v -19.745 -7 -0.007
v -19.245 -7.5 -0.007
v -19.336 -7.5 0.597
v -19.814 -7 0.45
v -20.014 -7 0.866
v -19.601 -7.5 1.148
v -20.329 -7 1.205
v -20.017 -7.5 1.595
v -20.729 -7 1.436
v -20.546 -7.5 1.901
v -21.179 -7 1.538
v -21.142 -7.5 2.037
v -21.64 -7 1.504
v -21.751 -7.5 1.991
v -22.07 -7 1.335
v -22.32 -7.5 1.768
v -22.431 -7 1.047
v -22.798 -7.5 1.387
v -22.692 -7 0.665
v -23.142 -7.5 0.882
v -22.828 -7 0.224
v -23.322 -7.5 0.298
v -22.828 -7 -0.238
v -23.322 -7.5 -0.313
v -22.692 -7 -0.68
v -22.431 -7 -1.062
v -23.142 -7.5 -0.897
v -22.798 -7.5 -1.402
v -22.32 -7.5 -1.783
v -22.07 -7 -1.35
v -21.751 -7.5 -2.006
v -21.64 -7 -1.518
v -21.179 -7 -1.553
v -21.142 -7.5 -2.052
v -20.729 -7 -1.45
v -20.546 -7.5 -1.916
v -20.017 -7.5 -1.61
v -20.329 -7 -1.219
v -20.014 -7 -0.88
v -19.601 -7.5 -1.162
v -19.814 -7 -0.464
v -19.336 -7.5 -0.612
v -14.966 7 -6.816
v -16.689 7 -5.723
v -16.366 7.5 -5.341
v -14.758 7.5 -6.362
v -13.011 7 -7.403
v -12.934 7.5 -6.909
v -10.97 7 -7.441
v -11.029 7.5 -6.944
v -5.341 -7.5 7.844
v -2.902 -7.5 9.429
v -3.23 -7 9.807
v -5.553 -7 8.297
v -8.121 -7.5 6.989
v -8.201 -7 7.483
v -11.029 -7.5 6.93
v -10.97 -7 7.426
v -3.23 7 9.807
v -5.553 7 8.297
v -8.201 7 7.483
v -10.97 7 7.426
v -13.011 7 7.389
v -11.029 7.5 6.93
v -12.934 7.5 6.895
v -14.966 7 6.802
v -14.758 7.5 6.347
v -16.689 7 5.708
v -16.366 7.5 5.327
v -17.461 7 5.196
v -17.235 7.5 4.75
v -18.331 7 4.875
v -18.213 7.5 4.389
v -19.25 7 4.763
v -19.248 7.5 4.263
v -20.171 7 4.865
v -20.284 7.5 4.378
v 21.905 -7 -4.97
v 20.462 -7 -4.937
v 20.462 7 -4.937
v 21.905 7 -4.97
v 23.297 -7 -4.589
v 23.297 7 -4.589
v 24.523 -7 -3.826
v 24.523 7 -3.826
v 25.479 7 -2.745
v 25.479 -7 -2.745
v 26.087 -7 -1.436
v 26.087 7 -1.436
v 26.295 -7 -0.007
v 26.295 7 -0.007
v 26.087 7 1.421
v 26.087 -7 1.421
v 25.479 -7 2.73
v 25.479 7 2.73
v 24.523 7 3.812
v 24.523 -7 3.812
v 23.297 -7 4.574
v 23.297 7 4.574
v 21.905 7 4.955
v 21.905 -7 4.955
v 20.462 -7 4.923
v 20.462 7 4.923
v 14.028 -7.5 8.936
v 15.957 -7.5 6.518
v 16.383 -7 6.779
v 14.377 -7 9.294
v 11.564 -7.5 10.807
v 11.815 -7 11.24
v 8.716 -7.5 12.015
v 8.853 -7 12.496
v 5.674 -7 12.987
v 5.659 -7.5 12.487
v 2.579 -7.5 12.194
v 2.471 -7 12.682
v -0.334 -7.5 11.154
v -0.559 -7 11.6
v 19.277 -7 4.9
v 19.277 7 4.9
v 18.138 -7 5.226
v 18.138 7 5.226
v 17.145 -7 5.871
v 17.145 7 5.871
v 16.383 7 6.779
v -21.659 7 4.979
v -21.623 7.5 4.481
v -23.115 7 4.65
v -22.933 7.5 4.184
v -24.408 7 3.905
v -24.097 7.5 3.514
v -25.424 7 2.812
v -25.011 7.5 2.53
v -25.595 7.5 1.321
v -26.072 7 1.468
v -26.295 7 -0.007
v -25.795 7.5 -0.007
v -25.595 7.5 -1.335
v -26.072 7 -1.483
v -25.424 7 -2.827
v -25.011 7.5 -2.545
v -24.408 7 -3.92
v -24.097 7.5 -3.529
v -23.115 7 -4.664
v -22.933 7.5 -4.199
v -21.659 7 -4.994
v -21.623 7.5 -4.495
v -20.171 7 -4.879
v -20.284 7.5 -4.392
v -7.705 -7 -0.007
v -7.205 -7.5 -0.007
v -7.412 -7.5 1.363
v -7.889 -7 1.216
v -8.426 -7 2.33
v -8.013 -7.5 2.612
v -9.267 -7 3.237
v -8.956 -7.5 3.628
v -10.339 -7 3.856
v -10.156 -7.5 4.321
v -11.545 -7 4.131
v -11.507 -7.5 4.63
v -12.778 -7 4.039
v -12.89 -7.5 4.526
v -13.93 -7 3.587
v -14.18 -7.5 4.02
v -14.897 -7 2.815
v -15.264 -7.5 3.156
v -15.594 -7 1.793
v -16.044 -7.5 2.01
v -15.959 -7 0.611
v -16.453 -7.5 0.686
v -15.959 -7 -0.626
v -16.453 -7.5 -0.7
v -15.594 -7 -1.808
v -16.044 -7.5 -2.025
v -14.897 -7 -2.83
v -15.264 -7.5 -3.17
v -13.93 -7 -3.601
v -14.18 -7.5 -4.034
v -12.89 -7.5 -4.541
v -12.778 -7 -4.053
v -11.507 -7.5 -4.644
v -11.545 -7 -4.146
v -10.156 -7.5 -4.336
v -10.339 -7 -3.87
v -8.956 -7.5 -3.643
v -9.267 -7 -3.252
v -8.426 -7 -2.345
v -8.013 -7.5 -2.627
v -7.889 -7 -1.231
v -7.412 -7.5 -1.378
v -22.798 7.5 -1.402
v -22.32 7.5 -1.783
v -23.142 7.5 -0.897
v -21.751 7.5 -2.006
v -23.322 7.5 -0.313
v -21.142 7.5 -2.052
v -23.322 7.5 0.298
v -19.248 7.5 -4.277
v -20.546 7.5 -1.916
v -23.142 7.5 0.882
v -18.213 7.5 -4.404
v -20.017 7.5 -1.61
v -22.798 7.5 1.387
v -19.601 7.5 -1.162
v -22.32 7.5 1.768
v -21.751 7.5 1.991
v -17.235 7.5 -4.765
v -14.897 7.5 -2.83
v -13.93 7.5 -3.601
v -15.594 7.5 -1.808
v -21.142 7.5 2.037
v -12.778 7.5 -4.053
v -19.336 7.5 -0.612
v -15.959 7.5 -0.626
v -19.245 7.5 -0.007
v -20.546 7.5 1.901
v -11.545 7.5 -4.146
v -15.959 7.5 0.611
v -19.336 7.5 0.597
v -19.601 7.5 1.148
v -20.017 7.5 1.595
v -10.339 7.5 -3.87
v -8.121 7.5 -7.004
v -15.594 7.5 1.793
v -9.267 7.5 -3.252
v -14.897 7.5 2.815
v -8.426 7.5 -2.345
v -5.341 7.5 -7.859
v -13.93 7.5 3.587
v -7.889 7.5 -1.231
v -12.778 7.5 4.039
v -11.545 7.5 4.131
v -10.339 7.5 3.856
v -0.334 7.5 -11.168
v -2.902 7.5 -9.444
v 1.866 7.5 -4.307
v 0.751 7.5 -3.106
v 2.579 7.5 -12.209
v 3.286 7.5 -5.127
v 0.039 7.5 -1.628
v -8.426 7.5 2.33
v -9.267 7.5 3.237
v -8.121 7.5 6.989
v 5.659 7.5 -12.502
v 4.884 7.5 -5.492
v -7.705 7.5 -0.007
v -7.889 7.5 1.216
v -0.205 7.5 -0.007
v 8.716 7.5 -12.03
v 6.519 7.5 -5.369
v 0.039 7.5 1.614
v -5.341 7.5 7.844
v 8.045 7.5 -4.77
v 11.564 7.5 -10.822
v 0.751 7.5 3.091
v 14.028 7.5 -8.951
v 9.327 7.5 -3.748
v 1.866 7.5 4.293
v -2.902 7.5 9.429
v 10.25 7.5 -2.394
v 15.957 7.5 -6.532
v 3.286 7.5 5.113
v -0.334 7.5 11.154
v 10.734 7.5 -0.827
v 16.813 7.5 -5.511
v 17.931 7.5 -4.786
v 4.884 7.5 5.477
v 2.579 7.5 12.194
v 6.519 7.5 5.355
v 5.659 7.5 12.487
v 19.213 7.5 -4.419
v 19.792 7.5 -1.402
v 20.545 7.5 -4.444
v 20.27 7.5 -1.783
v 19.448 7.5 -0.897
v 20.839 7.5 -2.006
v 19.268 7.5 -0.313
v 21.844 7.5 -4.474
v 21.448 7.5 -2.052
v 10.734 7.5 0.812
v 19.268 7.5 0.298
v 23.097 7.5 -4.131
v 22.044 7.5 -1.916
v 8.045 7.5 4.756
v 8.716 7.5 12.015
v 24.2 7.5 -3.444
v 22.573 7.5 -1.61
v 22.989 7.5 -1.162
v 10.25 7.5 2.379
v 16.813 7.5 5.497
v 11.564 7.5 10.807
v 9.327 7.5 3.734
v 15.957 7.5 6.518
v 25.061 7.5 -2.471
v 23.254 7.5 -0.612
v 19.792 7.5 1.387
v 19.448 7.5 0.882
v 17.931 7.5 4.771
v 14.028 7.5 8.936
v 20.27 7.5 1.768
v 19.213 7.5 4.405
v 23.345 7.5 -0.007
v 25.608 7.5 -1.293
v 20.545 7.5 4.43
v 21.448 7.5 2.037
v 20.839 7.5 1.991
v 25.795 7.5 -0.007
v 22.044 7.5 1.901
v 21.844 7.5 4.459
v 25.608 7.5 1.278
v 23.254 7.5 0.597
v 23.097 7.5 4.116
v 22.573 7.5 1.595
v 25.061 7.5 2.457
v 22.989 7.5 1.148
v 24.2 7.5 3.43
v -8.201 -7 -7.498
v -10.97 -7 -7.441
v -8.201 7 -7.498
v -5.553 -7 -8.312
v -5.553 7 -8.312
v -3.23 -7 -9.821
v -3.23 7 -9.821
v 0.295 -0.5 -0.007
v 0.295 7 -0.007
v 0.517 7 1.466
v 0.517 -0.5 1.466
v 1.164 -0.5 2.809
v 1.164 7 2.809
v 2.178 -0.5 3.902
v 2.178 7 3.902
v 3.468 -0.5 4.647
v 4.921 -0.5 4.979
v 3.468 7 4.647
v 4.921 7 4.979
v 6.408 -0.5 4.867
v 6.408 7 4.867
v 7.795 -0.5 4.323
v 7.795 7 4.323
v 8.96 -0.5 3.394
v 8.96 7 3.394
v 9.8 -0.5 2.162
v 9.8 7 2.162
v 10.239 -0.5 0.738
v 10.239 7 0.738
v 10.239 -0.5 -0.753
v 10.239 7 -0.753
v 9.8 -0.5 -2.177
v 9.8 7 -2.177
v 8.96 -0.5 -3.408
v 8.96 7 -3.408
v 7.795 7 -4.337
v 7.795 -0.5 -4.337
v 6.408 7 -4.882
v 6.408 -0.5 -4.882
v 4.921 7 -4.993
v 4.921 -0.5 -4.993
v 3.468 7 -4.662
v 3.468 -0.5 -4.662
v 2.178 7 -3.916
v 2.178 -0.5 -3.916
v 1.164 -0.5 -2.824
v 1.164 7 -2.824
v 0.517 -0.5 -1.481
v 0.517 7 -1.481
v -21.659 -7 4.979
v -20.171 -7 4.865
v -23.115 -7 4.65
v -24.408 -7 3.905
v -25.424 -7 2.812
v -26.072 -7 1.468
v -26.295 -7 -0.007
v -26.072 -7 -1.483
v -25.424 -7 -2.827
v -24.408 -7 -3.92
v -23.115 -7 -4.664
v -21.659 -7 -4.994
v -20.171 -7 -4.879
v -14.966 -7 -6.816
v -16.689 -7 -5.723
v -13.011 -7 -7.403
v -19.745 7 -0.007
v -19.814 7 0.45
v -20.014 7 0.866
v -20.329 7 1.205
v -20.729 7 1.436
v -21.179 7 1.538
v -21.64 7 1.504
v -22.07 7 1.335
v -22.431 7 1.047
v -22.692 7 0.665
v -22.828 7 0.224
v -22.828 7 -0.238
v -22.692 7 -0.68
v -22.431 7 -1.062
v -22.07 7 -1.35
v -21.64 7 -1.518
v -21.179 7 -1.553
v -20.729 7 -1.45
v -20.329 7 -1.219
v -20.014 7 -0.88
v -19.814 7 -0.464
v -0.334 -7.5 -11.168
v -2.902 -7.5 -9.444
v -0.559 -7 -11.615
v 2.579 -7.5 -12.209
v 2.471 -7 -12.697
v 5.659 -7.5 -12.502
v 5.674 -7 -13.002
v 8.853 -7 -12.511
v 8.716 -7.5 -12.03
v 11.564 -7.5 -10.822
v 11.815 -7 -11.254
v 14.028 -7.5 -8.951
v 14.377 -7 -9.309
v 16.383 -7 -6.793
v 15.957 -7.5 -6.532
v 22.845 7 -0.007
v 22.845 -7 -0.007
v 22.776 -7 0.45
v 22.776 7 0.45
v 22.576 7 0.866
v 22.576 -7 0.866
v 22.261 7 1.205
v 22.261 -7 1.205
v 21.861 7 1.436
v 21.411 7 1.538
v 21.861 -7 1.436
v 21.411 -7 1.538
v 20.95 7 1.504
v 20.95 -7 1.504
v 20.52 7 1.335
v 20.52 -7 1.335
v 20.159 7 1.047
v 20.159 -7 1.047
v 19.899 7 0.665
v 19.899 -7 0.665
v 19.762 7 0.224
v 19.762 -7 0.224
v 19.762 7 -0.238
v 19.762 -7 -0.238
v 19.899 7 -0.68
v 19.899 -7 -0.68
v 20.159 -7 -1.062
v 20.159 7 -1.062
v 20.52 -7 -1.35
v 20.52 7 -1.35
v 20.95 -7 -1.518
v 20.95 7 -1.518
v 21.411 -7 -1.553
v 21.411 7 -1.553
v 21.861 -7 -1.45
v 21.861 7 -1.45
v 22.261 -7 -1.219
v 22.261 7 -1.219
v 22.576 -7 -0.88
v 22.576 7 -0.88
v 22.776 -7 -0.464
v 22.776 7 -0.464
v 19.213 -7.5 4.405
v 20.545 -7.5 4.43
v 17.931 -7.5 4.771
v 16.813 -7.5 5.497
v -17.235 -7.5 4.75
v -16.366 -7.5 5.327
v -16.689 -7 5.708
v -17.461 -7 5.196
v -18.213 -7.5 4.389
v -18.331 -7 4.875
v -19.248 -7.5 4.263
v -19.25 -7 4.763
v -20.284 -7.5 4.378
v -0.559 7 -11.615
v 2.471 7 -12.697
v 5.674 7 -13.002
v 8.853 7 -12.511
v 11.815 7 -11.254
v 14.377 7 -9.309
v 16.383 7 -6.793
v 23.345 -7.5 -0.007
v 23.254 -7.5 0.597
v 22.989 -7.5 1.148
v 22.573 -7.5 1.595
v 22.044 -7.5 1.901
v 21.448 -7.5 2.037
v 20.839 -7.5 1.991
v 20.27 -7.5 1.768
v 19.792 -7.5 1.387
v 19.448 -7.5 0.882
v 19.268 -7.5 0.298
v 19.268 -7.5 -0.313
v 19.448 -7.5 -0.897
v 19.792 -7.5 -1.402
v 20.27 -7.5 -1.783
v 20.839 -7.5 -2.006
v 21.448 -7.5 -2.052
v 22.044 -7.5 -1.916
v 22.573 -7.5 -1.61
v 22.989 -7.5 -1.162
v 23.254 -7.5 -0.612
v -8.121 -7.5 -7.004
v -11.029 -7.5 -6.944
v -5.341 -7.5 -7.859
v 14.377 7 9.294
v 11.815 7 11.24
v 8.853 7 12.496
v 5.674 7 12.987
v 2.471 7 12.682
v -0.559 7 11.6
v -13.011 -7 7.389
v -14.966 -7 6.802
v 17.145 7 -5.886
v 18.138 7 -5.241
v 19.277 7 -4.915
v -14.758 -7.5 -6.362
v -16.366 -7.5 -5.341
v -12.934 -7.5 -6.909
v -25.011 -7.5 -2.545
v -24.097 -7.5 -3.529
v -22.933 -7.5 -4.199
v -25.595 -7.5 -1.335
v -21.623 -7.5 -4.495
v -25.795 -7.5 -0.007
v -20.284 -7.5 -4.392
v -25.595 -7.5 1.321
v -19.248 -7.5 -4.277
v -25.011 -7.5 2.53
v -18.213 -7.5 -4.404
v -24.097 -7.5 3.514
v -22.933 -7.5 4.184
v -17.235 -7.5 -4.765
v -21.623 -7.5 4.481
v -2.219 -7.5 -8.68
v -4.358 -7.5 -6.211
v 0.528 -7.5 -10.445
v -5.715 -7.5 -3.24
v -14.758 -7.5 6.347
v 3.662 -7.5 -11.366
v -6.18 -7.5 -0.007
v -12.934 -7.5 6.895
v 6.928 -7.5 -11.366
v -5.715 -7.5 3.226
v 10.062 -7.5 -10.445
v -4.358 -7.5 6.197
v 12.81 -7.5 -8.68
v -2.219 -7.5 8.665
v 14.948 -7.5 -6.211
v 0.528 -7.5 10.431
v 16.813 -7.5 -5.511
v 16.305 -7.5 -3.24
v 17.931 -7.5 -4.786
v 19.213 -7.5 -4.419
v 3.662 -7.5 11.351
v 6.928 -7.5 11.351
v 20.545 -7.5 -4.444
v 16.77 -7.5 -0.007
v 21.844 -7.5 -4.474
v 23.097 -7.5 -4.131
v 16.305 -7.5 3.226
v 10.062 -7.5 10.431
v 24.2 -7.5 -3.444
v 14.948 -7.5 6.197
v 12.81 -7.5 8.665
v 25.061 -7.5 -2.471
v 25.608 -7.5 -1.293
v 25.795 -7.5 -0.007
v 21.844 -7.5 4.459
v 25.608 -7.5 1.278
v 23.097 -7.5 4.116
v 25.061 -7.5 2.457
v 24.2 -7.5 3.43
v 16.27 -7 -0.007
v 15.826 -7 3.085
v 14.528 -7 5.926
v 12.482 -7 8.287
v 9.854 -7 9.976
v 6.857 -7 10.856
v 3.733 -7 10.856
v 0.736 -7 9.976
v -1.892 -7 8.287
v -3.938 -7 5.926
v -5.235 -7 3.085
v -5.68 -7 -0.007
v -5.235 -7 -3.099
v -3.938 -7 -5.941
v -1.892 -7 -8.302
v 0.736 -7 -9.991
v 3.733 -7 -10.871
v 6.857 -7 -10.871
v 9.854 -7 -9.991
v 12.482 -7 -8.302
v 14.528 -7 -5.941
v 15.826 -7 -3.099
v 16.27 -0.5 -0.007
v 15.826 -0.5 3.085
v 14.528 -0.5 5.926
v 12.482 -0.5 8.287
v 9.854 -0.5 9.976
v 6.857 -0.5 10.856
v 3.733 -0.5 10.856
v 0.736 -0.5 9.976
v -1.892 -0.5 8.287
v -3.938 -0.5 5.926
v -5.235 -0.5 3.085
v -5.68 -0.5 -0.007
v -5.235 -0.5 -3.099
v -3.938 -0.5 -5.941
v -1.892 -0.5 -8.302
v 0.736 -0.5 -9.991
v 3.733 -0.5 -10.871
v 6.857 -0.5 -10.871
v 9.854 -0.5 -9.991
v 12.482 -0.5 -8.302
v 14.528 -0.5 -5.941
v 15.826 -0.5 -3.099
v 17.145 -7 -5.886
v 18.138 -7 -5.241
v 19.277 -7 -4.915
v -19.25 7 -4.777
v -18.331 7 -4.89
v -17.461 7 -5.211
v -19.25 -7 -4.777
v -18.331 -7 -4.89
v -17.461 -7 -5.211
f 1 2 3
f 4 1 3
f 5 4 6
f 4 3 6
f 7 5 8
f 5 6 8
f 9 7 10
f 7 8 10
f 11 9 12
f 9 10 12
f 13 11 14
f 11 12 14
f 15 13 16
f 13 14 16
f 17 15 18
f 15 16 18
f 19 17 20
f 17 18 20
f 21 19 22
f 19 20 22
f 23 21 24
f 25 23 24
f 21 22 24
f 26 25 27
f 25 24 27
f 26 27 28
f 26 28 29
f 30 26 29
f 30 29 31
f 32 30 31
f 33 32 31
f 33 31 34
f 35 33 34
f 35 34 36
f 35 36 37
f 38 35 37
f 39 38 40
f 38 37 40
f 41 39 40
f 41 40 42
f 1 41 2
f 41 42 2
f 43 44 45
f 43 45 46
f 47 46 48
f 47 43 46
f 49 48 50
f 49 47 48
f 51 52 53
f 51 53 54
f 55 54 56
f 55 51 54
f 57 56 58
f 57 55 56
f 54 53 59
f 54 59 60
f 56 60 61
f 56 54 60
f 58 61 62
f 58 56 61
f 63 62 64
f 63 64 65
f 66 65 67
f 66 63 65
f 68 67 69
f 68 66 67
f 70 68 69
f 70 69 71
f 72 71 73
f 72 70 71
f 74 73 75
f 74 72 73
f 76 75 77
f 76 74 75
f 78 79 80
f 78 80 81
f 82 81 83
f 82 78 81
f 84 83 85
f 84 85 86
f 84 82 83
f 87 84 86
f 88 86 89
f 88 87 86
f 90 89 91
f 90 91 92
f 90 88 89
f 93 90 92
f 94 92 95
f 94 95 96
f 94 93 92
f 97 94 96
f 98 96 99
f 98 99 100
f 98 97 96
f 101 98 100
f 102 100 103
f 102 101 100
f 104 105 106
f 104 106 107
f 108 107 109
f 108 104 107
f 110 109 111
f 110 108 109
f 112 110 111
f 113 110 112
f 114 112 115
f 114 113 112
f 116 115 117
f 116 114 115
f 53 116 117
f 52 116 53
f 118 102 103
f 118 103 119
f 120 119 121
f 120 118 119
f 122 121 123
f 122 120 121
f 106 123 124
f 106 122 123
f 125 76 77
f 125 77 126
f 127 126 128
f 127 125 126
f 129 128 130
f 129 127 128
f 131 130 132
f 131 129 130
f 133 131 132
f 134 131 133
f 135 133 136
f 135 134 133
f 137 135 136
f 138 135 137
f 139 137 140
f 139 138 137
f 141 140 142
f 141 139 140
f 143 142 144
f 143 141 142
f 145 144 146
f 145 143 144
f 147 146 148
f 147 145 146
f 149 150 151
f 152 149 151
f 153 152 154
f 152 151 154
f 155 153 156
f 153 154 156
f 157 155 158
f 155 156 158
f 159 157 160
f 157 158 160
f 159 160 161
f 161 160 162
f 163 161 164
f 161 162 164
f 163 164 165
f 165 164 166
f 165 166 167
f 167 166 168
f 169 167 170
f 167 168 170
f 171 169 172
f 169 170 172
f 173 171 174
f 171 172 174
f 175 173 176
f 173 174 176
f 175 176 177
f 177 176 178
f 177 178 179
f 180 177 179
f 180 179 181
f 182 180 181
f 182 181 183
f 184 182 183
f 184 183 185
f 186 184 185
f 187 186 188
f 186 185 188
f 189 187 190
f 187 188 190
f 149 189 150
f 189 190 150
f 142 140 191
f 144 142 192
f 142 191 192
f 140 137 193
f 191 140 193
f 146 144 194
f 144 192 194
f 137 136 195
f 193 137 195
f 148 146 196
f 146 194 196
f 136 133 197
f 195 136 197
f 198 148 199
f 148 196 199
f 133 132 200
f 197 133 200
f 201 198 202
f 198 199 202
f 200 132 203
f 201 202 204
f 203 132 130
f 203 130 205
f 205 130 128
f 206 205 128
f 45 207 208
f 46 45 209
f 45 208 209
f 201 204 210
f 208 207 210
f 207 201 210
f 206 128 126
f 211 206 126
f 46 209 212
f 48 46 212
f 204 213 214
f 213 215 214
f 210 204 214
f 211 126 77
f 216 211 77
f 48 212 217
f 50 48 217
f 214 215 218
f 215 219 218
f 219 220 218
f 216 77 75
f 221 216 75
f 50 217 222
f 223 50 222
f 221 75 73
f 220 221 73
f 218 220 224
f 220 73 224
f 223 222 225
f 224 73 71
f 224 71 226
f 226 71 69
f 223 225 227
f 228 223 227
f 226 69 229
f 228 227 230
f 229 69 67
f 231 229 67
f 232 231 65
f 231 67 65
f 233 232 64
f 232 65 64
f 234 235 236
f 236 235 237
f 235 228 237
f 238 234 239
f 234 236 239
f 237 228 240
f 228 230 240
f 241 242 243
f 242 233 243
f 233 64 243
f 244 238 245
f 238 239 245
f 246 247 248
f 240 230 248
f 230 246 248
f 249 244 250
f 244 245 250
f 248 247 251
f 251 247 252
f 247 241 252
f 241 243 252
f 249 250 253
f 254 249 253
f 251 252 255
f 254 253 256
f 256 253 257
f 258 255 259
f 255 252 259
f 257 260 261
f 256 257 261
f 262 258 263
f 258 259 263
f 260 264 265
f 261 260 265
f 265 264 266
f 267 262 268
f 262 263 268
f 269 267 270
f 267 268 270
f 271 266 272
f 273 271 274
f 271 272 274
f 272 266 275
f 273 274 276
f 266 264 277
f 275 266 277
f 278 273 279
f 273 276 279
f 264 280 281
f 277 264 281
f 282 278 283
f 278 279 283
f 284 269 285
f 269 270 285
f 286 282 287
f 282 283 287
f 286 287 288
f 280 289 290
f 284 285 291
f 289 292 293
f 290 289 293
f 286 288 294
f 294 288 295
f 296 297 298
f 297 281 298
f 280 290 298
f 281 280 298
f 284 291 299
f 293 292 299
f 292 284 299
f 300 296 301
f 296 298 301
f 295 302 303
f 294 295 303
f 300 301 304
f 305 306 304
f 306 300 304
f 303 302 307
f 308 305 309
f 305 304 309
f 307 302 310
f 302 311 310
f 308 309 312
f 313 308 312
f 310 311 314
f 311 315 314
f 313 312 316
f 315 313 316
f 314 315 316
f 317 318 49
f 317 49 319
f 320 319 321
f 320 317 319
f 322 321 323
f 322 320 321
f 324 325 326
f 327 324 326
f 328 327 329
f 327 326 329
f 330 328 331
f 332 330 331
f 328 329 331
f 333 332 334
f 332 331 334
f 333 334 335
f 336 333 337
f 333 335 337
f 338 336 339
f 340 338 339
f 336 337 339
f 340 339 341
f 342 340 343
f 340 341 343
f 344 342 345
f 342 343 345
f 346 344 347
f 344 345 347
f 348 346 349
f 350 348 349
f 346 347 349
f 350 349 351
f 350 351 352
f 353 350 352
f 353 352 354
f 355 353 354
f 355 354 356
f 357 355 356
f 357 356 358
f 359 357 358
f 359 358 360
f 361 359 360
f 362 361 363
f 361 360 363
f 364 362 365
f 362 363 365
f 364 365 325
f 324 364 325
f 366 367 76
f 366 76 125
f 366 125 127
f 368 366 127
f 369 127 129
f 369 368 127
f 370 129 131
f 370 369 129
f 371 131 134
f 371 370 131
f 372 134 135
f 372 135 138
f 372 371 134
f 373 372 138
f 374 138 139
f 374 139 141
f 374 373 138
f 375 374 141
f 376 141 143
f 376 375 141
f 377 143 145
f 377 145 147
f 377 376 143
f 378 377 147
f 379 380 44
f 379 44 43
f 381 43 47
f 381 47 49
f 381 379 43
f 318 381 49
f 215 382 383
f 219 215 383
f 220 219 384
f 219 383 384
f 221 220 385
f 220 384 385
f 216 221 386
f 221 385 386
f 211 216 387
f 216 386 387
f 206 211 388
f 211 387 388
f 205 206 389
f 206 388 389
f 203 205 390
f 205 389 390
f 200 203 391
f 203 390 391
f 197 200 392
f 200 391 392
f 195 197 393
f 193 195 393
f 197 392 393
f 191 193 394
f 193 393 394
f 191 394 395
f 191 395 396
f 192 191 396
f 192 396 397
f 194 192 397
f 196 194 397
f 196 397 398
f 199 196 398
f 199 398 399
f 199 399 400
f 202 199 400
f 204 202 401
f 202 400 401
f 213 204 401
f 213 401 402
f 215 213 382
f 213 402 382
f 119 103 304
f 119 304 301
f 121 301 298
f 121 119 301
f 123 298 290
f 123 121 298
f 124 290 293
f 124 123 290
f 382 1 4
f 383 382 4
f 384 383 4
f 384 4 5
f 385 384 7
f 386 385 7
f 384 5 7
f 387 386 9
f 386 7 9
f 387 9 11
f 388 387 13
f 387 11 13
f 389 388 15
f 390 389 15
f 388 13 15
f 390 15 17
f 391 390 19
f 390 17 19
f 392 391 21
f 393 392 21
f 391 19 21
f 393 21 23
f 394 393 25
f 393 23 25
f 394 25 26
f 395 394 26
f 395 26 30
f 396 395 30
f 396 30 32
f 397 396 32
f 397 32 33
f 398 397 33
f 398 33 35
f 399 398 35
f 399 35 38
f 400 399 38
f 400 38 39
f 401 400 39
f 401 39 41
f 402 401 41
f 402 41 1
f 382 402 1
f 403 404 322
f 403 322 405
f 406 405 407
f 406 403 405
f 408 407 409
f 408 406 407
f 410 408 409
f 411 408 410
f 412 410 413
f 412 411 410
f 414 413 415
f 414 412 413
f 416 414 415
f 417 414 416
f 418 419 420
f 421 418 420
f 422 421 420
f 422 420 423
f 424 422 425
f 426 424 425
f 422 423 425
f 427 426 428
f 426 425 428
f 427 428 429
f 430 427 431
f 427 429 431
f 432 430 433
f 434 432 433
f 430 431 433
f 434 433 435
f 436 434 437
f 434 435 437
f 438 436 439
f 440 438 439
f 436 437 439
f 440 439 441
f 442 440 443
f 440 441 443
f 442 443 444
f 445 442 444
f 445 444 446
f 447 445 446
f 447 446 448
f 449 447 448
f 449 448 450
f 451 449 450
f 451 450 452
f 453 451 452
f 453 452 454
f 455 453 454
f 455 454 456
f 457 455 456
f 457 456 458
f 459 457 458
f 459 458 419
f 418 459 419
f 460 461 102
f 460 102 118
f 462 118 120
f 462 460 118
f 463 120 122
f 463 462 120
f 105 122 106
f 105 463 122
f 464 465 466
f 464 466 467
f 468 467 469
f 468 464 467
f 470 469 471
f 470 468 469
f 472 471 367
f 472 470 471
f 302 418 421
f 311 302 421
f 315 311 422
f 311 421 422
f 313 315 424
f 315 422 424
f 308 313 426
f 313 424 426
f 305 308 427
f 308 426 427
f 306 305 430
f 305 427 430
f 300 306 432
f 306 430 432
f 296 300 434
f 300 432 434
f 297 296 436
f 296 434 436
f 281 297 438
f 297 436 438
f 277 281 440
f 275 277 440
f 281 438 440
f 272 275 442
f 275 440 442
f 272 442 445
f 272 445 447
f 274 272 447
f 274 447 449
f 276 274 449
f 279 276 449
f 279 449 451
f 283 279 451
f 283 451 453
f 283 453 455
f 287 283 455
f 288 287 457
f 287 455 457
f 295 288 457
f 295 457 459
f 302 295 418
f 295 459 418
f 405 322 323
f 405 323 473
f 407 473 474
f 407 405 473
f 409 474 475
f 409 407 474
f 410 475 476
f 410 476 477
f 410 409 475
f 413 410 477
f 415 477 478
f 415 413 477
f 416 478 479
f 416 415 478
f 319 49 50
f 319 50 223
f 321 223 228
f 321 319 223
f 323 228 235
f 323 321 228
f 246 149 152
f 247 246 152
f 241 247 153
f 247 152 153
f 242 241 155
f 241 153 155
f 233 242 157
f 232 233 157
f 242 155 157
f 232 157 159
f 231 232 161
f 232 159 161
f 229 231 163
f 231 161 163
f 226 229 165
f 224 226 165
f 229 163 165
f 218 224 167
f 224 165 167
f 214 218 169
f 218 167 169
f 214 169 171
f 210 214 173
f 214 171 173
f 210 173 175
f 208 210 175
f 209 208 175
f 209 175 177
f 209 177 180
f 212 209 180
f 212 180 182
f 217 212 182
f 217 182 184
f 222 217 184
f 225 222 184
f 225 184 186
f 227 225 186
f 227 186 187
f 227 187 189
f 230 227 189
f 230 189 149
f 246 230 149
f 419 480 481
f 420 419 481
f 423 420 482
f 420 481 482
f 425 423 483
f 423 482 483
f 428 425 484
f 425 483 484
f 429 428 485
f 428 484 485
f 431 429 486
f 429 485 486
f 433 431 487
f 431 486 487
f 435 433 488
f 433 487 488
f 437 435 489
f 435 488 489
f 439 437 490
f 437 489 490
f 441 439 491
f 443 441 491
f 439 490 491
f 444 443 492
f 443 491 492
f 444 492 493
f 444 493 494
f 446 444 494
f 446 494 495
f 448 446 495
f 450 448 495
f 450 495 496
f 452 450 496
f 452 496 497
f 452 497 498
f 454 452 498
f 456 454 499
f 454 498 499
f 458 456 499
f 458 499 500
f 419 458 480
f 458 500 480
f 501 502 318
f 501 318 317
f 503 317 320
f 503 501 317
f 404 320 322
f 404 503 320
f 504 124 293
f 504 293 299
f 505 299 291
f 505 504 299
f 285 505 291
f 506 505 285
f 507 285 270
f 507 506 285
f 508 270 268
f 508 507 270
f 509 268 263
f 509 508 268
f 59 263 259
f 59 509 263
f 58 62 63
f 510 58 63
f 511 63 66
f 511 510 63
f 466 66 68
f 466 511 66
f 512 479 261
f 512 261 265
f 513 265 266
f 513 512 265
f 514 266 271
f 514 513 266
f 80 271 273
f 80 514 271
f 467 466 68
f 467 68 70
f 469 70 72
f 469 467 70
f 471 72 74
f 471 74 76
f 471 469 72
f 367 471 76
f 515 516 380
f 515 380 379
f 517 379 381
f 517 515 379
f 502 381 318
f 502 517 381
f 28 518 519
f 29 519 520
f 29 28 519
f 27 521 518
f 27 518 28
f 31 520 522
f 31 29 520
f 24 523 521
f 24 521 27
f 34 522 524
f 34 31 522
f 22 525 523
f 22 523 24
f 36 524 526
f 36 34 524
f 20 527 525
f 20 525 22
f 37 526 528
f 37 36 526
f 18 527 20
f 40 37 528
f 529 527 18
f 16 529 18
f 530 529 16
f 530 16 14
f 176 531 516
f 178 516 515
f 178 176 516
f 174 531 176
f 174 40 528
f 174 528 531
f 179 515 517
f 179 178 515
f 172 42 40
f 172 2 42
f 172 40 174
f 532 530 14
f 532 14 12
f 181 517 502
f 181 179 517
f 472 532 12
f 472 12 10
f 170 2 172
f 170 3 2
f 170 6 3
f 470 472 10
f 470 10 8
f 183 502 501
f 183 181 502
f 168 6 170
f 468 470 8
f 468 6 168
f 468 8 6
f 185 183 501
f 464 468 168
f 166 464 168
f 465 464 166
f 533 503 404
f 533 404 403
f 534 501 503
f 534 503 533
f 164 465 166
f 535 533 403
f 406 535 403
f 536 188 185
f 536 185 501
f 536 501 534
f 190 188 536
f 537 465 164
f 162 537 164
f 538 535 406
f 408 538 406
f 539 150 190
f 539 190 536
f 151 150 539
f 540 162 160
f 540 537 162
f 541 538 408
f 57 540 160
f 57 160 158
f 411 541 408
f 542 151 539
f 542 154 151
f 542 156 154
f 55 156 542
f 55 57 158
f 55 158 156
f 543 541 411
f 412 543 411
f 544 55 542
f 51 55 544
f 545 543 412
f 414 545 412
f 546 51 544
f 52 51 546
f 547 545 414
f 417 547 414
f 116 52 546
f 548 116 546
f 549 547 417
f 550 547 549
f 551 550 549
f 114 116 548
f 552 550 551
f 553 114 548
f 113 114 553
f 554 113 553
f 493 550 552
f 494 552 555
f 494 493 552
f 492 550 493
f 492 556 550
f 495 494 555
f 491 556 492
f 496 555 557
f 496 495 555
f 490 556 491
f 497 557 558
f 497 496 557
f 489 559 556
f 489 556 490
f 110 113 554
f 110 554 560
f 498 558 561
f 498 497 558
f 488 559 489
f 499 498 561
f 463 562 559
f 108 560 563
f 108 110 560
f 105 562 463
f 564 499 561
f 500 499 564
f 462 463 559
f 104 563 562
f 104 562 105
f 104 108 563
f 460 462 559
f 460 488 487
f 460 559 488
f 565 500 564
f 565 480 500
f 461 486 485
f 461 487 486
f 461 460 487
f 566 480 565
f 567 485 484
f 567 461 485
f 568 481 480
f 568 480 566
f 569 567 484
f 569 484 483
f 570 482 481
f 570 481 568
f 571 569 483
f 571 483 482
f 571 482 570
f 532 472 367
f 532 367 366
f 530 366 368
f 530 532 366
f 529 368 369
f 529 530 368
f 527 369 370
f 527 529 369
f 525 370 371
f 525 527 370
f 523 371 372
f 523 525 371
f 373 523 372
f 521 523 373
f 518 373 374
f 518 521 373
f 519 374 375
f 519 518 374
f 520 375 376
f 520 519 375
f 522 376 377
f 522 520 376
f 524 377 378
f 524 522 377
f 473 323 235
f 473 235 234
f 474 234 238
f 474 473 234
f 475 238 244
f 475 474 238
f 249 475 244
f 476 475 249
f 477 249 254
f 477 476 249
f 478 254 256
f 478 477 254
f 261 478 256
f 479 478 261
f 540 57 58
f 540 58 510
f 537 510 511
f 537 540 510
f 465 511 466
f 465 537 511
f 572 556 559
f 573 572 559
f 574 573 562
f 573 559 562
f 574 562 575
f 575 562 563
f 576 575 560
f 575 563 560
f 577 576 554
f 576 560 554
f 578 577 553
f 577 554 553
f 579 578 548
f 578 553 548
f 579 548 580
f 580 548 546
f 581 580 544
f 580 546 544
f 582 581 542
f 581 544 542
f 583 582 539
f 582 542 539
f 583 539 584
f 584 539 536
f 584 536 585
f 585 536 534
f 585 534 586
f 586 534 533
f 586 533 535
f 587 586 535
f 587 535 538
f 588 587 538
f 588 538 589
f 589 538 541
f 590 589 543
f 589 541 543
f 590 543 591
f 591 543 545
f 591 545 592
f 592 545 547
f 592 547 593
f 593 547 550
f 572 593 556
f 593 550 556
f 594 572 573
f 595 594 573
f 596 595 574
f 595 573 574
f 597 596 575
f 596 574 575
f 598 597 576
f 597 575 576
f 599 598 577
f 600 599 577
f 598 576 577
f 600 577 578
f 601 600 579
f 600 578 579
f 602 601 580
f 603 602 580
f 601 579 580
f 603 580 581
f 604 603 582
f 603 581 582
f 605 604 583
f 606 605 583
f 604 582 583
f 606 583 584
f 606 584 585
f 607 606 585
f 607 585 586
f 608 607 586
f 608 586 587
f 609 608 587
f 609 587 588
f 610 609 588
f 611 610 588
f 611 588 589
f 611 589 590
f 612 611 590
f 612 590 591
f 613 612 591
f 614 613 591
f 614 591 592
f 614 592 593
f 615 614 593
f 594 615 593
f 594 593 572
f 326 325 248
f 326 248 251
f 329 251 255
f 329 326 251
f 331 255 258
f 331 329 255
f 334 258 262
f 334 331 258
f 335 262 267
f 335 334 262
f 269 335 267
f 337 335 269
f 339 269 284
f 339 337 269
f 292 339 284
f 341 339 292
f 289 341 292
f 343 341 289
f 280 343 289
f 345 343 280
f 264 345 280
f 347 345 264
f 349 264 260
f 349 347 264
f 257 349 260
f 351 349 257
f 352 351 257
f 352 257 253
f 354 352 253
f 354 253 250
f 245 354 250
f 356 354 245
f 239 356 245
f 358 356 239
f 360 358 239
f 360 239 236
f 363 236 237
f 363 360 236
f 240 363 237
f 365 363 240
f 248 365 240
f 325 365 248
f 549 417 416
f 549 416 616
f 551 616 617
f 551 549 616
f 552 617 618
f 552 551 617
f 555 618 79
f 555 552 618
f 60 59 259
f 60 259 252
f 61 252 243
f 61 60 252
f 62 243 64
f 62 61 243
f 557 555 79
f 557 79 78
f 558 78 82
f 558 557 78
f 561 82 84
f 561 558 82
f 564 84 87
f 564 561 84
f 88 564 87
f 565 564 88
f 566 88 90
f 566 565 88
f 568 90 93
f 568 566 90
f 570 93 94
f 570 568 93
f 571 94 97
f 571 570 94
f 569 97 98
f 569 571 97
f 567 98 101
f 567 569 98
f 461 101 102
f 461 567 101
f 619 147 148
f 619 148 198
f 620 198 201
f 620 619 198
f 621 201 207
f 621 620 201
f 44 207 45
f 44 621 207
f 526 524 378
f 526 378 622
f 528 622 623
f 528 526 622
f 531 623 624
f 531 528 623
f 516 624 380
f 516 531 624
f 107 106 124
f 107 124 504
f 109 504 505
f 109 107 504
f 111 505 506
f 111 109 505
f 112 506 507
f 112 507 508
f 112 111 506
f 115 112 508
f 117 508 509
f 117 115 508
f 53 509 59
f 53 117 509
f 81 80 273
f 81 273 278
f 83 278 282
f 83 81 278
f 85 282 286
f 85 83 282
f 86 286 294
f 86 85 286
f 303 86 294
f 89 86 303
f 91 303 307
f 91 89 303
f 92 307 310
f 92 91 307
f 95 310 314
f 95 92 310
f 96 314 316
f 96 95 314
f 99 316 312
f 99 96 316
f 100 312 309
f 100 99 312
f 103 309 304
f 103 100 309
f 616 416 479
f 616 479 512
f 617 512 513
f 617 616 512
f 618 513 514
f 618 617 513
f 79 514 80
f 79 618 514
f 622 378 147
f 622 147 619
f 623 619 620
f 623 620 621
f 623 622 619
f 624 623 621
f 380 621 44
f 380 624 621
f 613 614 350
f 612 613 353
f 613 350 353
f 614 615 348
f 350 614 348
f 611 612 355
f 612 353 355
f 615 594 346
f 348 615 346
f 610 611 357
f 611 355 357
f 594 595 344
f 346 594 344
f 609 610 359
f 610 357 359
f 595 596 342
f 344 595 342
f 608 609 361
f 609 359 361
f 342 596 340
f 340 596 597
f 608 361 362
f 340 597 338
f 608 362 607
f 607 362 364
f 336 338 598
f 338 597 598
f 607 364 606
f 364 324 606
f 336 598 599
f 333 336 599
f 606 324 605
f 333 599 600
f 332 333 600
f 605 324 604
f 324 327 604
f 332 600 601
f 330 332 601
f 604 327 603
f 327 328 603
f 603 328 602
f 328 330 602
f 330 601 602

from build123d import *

# Parameters (mm, degrees)
F1_R     = 1.5499996566
F1_R_2   = 4.15
F1_R_3   = 10.975
F2_DEPTH = 15
F3_R     = 1.5499996566
F3_R_2   = 10.975
F3_R_3   = 4.15
F3_R_4   = 5
F4_DEPTH = 8
F5_SIZE  = 0.5


# Not quite as in the source:
# - a feature names something its author has since deleted; it is built from what else it names


with BuildPart() as f2:
    # F1 (on offset) → F2 (new body)
    with BuildSketch(Plane.XZ.offset(7.5)):
        with BuildLine():
            ThreePointArc((-16.6892397333, 5.7083826769), (-18.3305665894, 4.8749174948), (-20.1713586703, 4.8647896648))
            ThreePointArc((-20.1713586703, 4.8647896648), (-26.2950827169, -0.0072979827), (-20.1713596113, -4.879386813))
            ThreePointArc((-20.1713596113, -4.879386813), (-18.3305675322, -4.8895149984), (-16.6892408371, -5.7229804975))
            ThreePointArc((-16.6892408371, -5.7229804975), (-14.008426037, -7.1768258733), (-10.9702112996, -7.4408061354))
            ThreePointArc((-10.9702112996, -7.4408061354), (-6.8485397196, -7.8126278343), (-3.2303605207, -9.8214103693))
            ThreePointArc((-3.2303605207, -9.8214103693), (7.2785660743, -12.855093715), (16.3833205976, -6.7933928076))
            ThreePointArc((16.3833205976, -6.7933928076), (18.1382514389, -5.2406931628), (20.4617514792, -4.9373682419))
            ThreePointArc((20.4617514792, -4.9373682419), (26.2950863861, -0.0073004118), (20.4617519197, 4.9227679396))
            ThreePointArc((20.4617519197, 4.9227679396), (18.1382519066, 5.2260930681), (16.383321204, 6.7787928697))
            ThreePointArc((16.383321204, 6.7787928697), (7.2785667206, 12.8404946682), (-3.2303604104, 9.8068115182))
            ThreePointArc((-3.2303604104, 9.8068115182), (-6.8485396319, 7.7980290238), (-10.970211216, 7.4262073712))
            ThreePointArc((-10.970211216, 7.4262073712), (-14.0084253044, 7.1622273392), (-16.6892397333, 5.7083826769))
        make_face()
        with Locations((21.2950848365, -0.0073001884)):
            Circle(F1_R, mode=Mode.SUBTRACT)
        with Locations((-21.2950828407, -0.0072984656)):
            Circle(F1_R, mode=Mode.SUBTRACT)
        with Locations((-11.8549144411, -0.0072993771)):
            Circle(F1_R_2, mode=Mode.SUBTRACT)
        with Locations((5.2950859535, -0.0072994735)):
            Circle(F1_R_3, mode=Mode.SUBTRACT)
    extrude(amount=-F2_DEPTH)

    # F3 (on face) → F4 (join)
    with BuildSketch(Plane(origin=(0, 7.5, 0), x_dir=(-1, 0, 0), z_dir=(0, 1, 0))):
        with BuildLine():
            ThreePointArc((10.970211216, 7.4262073712), (6.8485396319, 7.7980290238), (3.2303604104, 9.8068115182))
            ThreePointArc((3.2303604104, 9.8068115182), (-7.2785667206, 12.8404946682), (-16.383321204, 6.7787928697))
            ThreePointArc((-16.383321204, 6.7787928697), (-18.1382519066, 5.2260930681), (-20.4617519197, 4.9227679396))
            ThreePointArc((-20.4617519197, 4.9227679396), (-26.2950863861, -0.0073004118), (-20.4617514792, -4.9373682419))
            ThreePointArc((-20.4617514792, -4.9373682419), (-18.1382514389, -5.2406931628), (-16.3833205976, -6.7933928076))
            ThreePointArc((-16.3833205976, -6.7933928076), (-7.2785660743, -12.855093715), (3.2303605207, -9.8214103693))
            ThreePointArc((3.2303605207, -9.8214103693), (6.8485397196, -7.8126278343), (10.9702112996, -7.4408061354))
            ThreePointArc((10.9702112996, -7.4408061354), (14.008426037, -7.1768258733), (16.6892408371, -5.7229804975))
            ThreePointArc((16.6892408371, -5.7229804975), (18.3305675322, -4.8895149984), (20.1713596113, -4.879386813))
            ThreePointArc((20.1713596113, -4.879386813), (26.2950827169, -0.0072979827), (20.1713586703, 4.8647896648))
            ThreePointArc((20.1713586703, 4.8647896648), (18.3305665894, 4.8749174948), (16.6892397333, 5.7083826769))
            ThreePointArc((16.6892397333, 5.7083826769), (14.0084253044, 7.1622273392), (10.970211216, 7.4262073712))
        make_face()
        with Locations((-21.2950848365, -0.0073001884)):
            Circle(F3_R, mode=Mode.SUBTRACT)
        with Locations((-5.2950859535, -0.0072994735)):
            Circle(F3_R_2, mode=Mode.SUBTRACT)
        with Locations((11.8549144411, -0.0072993771)):
            Circle(F3_R_3, mode=Mode.SUBTRACT)
        with Locations((21.2950828407, -0.0072984656)):
            Circle(F3_R, mode=Mode.SUBTRACT)
        with Locations((-5.2950859535, -0.0072994735)):
            Circle(F3_R_2)
        with Locations((-5.2950859535, -0.0072994735)):
            Circle(F3_R_4, mode=Mode.SUBTRACT)
    extrude(amount=-F4_DEPTH)

    # F5
    f5_edges = [f2.edges().sort_by_distance(p)[0] for p in [
        (-6.84854, -7.5, 7.798029),
        (7.278567, -7.5, 12.840495),
        (18.138252, -7.5, 5.226093),
        (26.295086, -7.5, -0.0073),
        (18.138251, -7.5, -5.240693),
        (7.278566, -7.5, -12.855094),
        (-6.84854, -7.5, -7.812628),
        (-14.008426, -7.5, -7.176826),
        (-18.330568, -7.5, -4.889515),
        (-26.295083, -7.5, -0.007298),
        (-18.330567, -7.5, 4.874917),
        (-14.008425, -7.5, 7.162227),
        (-5.679914, -7.5, -0.007299),
        (-22.845082, -7.5, -0.007298),
        (19.745085, -7.5, -0.0073),
        (7.278567, 7.5, 12.840495),
        (-22.845082, 7.5, -0.007298),
        (10.295086, 7.5, -0.007299),
        (19.745085, 7.5, -0.0073),
        (-16.004914, -7.5, -0.007299),
        (-6.84854, 7.5, 7.798029),
        (-14.008425, 7.5, 7.162227),
        (-18.330567, 7.5, 4.874917),
        (-26.295083, 7.5, -0.007298),
        (-18.330568, 7.5, -4.889515),
        (-14.008426, 7.5, -7.176826),
        (-6.84854, 7.5, -7.812628),
        (7.278566, 7.5, -12.855094),
        (18.138251, 7.5, -5.240693),
        (26.295086, 7.5, -0.0073),
        (18.138252, 7.5, 5.226093),
    ]]
    chamfer(f5_edges, length=F5_SIZE)


solid = f2.part
